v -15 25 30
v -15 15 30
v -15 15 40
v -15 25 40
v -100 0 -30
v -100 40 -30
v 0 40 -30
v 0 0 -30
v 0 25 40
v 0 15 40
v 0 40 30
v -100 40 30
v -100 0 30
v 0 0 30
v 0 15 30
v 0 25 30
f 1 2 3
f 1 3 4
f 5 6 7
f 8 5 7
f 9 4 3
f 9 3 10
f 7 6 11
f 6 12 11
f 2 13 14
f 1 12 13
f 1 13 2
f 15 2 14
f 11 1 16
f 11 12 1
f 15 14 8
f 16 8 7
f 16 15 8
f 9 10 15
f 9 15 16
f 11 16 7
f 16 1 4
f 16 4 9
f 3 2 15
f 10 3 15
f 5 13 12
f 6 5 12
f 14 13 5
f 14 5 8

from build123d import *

# Parameters (mm, degrees)
F0_W     = 100
F0_H     = 40
F1_DEPTH = 30
F2_W     = 15
F2_H     = 10
F3_DEPTH = 10


with BuildPart() as f1:
    # F0 (on Top) → F1 (new body, symmetric)
    with BuildSketch(Plane.XY):
        with Locations((-50, 20)):
            Rectangle(F0_W, F0_H)
    extrude(amount=F1_DEPTH, both=True)

    # F2 (on face) → F3 (join)
    with BuildSketch(Plane.XY.offset(30)):
        with Locations((-7.5, 20)):
            Rectangle(F2_W, F2_H)
    extrude(amount=F3_DEPTH)


solid = f1.part
